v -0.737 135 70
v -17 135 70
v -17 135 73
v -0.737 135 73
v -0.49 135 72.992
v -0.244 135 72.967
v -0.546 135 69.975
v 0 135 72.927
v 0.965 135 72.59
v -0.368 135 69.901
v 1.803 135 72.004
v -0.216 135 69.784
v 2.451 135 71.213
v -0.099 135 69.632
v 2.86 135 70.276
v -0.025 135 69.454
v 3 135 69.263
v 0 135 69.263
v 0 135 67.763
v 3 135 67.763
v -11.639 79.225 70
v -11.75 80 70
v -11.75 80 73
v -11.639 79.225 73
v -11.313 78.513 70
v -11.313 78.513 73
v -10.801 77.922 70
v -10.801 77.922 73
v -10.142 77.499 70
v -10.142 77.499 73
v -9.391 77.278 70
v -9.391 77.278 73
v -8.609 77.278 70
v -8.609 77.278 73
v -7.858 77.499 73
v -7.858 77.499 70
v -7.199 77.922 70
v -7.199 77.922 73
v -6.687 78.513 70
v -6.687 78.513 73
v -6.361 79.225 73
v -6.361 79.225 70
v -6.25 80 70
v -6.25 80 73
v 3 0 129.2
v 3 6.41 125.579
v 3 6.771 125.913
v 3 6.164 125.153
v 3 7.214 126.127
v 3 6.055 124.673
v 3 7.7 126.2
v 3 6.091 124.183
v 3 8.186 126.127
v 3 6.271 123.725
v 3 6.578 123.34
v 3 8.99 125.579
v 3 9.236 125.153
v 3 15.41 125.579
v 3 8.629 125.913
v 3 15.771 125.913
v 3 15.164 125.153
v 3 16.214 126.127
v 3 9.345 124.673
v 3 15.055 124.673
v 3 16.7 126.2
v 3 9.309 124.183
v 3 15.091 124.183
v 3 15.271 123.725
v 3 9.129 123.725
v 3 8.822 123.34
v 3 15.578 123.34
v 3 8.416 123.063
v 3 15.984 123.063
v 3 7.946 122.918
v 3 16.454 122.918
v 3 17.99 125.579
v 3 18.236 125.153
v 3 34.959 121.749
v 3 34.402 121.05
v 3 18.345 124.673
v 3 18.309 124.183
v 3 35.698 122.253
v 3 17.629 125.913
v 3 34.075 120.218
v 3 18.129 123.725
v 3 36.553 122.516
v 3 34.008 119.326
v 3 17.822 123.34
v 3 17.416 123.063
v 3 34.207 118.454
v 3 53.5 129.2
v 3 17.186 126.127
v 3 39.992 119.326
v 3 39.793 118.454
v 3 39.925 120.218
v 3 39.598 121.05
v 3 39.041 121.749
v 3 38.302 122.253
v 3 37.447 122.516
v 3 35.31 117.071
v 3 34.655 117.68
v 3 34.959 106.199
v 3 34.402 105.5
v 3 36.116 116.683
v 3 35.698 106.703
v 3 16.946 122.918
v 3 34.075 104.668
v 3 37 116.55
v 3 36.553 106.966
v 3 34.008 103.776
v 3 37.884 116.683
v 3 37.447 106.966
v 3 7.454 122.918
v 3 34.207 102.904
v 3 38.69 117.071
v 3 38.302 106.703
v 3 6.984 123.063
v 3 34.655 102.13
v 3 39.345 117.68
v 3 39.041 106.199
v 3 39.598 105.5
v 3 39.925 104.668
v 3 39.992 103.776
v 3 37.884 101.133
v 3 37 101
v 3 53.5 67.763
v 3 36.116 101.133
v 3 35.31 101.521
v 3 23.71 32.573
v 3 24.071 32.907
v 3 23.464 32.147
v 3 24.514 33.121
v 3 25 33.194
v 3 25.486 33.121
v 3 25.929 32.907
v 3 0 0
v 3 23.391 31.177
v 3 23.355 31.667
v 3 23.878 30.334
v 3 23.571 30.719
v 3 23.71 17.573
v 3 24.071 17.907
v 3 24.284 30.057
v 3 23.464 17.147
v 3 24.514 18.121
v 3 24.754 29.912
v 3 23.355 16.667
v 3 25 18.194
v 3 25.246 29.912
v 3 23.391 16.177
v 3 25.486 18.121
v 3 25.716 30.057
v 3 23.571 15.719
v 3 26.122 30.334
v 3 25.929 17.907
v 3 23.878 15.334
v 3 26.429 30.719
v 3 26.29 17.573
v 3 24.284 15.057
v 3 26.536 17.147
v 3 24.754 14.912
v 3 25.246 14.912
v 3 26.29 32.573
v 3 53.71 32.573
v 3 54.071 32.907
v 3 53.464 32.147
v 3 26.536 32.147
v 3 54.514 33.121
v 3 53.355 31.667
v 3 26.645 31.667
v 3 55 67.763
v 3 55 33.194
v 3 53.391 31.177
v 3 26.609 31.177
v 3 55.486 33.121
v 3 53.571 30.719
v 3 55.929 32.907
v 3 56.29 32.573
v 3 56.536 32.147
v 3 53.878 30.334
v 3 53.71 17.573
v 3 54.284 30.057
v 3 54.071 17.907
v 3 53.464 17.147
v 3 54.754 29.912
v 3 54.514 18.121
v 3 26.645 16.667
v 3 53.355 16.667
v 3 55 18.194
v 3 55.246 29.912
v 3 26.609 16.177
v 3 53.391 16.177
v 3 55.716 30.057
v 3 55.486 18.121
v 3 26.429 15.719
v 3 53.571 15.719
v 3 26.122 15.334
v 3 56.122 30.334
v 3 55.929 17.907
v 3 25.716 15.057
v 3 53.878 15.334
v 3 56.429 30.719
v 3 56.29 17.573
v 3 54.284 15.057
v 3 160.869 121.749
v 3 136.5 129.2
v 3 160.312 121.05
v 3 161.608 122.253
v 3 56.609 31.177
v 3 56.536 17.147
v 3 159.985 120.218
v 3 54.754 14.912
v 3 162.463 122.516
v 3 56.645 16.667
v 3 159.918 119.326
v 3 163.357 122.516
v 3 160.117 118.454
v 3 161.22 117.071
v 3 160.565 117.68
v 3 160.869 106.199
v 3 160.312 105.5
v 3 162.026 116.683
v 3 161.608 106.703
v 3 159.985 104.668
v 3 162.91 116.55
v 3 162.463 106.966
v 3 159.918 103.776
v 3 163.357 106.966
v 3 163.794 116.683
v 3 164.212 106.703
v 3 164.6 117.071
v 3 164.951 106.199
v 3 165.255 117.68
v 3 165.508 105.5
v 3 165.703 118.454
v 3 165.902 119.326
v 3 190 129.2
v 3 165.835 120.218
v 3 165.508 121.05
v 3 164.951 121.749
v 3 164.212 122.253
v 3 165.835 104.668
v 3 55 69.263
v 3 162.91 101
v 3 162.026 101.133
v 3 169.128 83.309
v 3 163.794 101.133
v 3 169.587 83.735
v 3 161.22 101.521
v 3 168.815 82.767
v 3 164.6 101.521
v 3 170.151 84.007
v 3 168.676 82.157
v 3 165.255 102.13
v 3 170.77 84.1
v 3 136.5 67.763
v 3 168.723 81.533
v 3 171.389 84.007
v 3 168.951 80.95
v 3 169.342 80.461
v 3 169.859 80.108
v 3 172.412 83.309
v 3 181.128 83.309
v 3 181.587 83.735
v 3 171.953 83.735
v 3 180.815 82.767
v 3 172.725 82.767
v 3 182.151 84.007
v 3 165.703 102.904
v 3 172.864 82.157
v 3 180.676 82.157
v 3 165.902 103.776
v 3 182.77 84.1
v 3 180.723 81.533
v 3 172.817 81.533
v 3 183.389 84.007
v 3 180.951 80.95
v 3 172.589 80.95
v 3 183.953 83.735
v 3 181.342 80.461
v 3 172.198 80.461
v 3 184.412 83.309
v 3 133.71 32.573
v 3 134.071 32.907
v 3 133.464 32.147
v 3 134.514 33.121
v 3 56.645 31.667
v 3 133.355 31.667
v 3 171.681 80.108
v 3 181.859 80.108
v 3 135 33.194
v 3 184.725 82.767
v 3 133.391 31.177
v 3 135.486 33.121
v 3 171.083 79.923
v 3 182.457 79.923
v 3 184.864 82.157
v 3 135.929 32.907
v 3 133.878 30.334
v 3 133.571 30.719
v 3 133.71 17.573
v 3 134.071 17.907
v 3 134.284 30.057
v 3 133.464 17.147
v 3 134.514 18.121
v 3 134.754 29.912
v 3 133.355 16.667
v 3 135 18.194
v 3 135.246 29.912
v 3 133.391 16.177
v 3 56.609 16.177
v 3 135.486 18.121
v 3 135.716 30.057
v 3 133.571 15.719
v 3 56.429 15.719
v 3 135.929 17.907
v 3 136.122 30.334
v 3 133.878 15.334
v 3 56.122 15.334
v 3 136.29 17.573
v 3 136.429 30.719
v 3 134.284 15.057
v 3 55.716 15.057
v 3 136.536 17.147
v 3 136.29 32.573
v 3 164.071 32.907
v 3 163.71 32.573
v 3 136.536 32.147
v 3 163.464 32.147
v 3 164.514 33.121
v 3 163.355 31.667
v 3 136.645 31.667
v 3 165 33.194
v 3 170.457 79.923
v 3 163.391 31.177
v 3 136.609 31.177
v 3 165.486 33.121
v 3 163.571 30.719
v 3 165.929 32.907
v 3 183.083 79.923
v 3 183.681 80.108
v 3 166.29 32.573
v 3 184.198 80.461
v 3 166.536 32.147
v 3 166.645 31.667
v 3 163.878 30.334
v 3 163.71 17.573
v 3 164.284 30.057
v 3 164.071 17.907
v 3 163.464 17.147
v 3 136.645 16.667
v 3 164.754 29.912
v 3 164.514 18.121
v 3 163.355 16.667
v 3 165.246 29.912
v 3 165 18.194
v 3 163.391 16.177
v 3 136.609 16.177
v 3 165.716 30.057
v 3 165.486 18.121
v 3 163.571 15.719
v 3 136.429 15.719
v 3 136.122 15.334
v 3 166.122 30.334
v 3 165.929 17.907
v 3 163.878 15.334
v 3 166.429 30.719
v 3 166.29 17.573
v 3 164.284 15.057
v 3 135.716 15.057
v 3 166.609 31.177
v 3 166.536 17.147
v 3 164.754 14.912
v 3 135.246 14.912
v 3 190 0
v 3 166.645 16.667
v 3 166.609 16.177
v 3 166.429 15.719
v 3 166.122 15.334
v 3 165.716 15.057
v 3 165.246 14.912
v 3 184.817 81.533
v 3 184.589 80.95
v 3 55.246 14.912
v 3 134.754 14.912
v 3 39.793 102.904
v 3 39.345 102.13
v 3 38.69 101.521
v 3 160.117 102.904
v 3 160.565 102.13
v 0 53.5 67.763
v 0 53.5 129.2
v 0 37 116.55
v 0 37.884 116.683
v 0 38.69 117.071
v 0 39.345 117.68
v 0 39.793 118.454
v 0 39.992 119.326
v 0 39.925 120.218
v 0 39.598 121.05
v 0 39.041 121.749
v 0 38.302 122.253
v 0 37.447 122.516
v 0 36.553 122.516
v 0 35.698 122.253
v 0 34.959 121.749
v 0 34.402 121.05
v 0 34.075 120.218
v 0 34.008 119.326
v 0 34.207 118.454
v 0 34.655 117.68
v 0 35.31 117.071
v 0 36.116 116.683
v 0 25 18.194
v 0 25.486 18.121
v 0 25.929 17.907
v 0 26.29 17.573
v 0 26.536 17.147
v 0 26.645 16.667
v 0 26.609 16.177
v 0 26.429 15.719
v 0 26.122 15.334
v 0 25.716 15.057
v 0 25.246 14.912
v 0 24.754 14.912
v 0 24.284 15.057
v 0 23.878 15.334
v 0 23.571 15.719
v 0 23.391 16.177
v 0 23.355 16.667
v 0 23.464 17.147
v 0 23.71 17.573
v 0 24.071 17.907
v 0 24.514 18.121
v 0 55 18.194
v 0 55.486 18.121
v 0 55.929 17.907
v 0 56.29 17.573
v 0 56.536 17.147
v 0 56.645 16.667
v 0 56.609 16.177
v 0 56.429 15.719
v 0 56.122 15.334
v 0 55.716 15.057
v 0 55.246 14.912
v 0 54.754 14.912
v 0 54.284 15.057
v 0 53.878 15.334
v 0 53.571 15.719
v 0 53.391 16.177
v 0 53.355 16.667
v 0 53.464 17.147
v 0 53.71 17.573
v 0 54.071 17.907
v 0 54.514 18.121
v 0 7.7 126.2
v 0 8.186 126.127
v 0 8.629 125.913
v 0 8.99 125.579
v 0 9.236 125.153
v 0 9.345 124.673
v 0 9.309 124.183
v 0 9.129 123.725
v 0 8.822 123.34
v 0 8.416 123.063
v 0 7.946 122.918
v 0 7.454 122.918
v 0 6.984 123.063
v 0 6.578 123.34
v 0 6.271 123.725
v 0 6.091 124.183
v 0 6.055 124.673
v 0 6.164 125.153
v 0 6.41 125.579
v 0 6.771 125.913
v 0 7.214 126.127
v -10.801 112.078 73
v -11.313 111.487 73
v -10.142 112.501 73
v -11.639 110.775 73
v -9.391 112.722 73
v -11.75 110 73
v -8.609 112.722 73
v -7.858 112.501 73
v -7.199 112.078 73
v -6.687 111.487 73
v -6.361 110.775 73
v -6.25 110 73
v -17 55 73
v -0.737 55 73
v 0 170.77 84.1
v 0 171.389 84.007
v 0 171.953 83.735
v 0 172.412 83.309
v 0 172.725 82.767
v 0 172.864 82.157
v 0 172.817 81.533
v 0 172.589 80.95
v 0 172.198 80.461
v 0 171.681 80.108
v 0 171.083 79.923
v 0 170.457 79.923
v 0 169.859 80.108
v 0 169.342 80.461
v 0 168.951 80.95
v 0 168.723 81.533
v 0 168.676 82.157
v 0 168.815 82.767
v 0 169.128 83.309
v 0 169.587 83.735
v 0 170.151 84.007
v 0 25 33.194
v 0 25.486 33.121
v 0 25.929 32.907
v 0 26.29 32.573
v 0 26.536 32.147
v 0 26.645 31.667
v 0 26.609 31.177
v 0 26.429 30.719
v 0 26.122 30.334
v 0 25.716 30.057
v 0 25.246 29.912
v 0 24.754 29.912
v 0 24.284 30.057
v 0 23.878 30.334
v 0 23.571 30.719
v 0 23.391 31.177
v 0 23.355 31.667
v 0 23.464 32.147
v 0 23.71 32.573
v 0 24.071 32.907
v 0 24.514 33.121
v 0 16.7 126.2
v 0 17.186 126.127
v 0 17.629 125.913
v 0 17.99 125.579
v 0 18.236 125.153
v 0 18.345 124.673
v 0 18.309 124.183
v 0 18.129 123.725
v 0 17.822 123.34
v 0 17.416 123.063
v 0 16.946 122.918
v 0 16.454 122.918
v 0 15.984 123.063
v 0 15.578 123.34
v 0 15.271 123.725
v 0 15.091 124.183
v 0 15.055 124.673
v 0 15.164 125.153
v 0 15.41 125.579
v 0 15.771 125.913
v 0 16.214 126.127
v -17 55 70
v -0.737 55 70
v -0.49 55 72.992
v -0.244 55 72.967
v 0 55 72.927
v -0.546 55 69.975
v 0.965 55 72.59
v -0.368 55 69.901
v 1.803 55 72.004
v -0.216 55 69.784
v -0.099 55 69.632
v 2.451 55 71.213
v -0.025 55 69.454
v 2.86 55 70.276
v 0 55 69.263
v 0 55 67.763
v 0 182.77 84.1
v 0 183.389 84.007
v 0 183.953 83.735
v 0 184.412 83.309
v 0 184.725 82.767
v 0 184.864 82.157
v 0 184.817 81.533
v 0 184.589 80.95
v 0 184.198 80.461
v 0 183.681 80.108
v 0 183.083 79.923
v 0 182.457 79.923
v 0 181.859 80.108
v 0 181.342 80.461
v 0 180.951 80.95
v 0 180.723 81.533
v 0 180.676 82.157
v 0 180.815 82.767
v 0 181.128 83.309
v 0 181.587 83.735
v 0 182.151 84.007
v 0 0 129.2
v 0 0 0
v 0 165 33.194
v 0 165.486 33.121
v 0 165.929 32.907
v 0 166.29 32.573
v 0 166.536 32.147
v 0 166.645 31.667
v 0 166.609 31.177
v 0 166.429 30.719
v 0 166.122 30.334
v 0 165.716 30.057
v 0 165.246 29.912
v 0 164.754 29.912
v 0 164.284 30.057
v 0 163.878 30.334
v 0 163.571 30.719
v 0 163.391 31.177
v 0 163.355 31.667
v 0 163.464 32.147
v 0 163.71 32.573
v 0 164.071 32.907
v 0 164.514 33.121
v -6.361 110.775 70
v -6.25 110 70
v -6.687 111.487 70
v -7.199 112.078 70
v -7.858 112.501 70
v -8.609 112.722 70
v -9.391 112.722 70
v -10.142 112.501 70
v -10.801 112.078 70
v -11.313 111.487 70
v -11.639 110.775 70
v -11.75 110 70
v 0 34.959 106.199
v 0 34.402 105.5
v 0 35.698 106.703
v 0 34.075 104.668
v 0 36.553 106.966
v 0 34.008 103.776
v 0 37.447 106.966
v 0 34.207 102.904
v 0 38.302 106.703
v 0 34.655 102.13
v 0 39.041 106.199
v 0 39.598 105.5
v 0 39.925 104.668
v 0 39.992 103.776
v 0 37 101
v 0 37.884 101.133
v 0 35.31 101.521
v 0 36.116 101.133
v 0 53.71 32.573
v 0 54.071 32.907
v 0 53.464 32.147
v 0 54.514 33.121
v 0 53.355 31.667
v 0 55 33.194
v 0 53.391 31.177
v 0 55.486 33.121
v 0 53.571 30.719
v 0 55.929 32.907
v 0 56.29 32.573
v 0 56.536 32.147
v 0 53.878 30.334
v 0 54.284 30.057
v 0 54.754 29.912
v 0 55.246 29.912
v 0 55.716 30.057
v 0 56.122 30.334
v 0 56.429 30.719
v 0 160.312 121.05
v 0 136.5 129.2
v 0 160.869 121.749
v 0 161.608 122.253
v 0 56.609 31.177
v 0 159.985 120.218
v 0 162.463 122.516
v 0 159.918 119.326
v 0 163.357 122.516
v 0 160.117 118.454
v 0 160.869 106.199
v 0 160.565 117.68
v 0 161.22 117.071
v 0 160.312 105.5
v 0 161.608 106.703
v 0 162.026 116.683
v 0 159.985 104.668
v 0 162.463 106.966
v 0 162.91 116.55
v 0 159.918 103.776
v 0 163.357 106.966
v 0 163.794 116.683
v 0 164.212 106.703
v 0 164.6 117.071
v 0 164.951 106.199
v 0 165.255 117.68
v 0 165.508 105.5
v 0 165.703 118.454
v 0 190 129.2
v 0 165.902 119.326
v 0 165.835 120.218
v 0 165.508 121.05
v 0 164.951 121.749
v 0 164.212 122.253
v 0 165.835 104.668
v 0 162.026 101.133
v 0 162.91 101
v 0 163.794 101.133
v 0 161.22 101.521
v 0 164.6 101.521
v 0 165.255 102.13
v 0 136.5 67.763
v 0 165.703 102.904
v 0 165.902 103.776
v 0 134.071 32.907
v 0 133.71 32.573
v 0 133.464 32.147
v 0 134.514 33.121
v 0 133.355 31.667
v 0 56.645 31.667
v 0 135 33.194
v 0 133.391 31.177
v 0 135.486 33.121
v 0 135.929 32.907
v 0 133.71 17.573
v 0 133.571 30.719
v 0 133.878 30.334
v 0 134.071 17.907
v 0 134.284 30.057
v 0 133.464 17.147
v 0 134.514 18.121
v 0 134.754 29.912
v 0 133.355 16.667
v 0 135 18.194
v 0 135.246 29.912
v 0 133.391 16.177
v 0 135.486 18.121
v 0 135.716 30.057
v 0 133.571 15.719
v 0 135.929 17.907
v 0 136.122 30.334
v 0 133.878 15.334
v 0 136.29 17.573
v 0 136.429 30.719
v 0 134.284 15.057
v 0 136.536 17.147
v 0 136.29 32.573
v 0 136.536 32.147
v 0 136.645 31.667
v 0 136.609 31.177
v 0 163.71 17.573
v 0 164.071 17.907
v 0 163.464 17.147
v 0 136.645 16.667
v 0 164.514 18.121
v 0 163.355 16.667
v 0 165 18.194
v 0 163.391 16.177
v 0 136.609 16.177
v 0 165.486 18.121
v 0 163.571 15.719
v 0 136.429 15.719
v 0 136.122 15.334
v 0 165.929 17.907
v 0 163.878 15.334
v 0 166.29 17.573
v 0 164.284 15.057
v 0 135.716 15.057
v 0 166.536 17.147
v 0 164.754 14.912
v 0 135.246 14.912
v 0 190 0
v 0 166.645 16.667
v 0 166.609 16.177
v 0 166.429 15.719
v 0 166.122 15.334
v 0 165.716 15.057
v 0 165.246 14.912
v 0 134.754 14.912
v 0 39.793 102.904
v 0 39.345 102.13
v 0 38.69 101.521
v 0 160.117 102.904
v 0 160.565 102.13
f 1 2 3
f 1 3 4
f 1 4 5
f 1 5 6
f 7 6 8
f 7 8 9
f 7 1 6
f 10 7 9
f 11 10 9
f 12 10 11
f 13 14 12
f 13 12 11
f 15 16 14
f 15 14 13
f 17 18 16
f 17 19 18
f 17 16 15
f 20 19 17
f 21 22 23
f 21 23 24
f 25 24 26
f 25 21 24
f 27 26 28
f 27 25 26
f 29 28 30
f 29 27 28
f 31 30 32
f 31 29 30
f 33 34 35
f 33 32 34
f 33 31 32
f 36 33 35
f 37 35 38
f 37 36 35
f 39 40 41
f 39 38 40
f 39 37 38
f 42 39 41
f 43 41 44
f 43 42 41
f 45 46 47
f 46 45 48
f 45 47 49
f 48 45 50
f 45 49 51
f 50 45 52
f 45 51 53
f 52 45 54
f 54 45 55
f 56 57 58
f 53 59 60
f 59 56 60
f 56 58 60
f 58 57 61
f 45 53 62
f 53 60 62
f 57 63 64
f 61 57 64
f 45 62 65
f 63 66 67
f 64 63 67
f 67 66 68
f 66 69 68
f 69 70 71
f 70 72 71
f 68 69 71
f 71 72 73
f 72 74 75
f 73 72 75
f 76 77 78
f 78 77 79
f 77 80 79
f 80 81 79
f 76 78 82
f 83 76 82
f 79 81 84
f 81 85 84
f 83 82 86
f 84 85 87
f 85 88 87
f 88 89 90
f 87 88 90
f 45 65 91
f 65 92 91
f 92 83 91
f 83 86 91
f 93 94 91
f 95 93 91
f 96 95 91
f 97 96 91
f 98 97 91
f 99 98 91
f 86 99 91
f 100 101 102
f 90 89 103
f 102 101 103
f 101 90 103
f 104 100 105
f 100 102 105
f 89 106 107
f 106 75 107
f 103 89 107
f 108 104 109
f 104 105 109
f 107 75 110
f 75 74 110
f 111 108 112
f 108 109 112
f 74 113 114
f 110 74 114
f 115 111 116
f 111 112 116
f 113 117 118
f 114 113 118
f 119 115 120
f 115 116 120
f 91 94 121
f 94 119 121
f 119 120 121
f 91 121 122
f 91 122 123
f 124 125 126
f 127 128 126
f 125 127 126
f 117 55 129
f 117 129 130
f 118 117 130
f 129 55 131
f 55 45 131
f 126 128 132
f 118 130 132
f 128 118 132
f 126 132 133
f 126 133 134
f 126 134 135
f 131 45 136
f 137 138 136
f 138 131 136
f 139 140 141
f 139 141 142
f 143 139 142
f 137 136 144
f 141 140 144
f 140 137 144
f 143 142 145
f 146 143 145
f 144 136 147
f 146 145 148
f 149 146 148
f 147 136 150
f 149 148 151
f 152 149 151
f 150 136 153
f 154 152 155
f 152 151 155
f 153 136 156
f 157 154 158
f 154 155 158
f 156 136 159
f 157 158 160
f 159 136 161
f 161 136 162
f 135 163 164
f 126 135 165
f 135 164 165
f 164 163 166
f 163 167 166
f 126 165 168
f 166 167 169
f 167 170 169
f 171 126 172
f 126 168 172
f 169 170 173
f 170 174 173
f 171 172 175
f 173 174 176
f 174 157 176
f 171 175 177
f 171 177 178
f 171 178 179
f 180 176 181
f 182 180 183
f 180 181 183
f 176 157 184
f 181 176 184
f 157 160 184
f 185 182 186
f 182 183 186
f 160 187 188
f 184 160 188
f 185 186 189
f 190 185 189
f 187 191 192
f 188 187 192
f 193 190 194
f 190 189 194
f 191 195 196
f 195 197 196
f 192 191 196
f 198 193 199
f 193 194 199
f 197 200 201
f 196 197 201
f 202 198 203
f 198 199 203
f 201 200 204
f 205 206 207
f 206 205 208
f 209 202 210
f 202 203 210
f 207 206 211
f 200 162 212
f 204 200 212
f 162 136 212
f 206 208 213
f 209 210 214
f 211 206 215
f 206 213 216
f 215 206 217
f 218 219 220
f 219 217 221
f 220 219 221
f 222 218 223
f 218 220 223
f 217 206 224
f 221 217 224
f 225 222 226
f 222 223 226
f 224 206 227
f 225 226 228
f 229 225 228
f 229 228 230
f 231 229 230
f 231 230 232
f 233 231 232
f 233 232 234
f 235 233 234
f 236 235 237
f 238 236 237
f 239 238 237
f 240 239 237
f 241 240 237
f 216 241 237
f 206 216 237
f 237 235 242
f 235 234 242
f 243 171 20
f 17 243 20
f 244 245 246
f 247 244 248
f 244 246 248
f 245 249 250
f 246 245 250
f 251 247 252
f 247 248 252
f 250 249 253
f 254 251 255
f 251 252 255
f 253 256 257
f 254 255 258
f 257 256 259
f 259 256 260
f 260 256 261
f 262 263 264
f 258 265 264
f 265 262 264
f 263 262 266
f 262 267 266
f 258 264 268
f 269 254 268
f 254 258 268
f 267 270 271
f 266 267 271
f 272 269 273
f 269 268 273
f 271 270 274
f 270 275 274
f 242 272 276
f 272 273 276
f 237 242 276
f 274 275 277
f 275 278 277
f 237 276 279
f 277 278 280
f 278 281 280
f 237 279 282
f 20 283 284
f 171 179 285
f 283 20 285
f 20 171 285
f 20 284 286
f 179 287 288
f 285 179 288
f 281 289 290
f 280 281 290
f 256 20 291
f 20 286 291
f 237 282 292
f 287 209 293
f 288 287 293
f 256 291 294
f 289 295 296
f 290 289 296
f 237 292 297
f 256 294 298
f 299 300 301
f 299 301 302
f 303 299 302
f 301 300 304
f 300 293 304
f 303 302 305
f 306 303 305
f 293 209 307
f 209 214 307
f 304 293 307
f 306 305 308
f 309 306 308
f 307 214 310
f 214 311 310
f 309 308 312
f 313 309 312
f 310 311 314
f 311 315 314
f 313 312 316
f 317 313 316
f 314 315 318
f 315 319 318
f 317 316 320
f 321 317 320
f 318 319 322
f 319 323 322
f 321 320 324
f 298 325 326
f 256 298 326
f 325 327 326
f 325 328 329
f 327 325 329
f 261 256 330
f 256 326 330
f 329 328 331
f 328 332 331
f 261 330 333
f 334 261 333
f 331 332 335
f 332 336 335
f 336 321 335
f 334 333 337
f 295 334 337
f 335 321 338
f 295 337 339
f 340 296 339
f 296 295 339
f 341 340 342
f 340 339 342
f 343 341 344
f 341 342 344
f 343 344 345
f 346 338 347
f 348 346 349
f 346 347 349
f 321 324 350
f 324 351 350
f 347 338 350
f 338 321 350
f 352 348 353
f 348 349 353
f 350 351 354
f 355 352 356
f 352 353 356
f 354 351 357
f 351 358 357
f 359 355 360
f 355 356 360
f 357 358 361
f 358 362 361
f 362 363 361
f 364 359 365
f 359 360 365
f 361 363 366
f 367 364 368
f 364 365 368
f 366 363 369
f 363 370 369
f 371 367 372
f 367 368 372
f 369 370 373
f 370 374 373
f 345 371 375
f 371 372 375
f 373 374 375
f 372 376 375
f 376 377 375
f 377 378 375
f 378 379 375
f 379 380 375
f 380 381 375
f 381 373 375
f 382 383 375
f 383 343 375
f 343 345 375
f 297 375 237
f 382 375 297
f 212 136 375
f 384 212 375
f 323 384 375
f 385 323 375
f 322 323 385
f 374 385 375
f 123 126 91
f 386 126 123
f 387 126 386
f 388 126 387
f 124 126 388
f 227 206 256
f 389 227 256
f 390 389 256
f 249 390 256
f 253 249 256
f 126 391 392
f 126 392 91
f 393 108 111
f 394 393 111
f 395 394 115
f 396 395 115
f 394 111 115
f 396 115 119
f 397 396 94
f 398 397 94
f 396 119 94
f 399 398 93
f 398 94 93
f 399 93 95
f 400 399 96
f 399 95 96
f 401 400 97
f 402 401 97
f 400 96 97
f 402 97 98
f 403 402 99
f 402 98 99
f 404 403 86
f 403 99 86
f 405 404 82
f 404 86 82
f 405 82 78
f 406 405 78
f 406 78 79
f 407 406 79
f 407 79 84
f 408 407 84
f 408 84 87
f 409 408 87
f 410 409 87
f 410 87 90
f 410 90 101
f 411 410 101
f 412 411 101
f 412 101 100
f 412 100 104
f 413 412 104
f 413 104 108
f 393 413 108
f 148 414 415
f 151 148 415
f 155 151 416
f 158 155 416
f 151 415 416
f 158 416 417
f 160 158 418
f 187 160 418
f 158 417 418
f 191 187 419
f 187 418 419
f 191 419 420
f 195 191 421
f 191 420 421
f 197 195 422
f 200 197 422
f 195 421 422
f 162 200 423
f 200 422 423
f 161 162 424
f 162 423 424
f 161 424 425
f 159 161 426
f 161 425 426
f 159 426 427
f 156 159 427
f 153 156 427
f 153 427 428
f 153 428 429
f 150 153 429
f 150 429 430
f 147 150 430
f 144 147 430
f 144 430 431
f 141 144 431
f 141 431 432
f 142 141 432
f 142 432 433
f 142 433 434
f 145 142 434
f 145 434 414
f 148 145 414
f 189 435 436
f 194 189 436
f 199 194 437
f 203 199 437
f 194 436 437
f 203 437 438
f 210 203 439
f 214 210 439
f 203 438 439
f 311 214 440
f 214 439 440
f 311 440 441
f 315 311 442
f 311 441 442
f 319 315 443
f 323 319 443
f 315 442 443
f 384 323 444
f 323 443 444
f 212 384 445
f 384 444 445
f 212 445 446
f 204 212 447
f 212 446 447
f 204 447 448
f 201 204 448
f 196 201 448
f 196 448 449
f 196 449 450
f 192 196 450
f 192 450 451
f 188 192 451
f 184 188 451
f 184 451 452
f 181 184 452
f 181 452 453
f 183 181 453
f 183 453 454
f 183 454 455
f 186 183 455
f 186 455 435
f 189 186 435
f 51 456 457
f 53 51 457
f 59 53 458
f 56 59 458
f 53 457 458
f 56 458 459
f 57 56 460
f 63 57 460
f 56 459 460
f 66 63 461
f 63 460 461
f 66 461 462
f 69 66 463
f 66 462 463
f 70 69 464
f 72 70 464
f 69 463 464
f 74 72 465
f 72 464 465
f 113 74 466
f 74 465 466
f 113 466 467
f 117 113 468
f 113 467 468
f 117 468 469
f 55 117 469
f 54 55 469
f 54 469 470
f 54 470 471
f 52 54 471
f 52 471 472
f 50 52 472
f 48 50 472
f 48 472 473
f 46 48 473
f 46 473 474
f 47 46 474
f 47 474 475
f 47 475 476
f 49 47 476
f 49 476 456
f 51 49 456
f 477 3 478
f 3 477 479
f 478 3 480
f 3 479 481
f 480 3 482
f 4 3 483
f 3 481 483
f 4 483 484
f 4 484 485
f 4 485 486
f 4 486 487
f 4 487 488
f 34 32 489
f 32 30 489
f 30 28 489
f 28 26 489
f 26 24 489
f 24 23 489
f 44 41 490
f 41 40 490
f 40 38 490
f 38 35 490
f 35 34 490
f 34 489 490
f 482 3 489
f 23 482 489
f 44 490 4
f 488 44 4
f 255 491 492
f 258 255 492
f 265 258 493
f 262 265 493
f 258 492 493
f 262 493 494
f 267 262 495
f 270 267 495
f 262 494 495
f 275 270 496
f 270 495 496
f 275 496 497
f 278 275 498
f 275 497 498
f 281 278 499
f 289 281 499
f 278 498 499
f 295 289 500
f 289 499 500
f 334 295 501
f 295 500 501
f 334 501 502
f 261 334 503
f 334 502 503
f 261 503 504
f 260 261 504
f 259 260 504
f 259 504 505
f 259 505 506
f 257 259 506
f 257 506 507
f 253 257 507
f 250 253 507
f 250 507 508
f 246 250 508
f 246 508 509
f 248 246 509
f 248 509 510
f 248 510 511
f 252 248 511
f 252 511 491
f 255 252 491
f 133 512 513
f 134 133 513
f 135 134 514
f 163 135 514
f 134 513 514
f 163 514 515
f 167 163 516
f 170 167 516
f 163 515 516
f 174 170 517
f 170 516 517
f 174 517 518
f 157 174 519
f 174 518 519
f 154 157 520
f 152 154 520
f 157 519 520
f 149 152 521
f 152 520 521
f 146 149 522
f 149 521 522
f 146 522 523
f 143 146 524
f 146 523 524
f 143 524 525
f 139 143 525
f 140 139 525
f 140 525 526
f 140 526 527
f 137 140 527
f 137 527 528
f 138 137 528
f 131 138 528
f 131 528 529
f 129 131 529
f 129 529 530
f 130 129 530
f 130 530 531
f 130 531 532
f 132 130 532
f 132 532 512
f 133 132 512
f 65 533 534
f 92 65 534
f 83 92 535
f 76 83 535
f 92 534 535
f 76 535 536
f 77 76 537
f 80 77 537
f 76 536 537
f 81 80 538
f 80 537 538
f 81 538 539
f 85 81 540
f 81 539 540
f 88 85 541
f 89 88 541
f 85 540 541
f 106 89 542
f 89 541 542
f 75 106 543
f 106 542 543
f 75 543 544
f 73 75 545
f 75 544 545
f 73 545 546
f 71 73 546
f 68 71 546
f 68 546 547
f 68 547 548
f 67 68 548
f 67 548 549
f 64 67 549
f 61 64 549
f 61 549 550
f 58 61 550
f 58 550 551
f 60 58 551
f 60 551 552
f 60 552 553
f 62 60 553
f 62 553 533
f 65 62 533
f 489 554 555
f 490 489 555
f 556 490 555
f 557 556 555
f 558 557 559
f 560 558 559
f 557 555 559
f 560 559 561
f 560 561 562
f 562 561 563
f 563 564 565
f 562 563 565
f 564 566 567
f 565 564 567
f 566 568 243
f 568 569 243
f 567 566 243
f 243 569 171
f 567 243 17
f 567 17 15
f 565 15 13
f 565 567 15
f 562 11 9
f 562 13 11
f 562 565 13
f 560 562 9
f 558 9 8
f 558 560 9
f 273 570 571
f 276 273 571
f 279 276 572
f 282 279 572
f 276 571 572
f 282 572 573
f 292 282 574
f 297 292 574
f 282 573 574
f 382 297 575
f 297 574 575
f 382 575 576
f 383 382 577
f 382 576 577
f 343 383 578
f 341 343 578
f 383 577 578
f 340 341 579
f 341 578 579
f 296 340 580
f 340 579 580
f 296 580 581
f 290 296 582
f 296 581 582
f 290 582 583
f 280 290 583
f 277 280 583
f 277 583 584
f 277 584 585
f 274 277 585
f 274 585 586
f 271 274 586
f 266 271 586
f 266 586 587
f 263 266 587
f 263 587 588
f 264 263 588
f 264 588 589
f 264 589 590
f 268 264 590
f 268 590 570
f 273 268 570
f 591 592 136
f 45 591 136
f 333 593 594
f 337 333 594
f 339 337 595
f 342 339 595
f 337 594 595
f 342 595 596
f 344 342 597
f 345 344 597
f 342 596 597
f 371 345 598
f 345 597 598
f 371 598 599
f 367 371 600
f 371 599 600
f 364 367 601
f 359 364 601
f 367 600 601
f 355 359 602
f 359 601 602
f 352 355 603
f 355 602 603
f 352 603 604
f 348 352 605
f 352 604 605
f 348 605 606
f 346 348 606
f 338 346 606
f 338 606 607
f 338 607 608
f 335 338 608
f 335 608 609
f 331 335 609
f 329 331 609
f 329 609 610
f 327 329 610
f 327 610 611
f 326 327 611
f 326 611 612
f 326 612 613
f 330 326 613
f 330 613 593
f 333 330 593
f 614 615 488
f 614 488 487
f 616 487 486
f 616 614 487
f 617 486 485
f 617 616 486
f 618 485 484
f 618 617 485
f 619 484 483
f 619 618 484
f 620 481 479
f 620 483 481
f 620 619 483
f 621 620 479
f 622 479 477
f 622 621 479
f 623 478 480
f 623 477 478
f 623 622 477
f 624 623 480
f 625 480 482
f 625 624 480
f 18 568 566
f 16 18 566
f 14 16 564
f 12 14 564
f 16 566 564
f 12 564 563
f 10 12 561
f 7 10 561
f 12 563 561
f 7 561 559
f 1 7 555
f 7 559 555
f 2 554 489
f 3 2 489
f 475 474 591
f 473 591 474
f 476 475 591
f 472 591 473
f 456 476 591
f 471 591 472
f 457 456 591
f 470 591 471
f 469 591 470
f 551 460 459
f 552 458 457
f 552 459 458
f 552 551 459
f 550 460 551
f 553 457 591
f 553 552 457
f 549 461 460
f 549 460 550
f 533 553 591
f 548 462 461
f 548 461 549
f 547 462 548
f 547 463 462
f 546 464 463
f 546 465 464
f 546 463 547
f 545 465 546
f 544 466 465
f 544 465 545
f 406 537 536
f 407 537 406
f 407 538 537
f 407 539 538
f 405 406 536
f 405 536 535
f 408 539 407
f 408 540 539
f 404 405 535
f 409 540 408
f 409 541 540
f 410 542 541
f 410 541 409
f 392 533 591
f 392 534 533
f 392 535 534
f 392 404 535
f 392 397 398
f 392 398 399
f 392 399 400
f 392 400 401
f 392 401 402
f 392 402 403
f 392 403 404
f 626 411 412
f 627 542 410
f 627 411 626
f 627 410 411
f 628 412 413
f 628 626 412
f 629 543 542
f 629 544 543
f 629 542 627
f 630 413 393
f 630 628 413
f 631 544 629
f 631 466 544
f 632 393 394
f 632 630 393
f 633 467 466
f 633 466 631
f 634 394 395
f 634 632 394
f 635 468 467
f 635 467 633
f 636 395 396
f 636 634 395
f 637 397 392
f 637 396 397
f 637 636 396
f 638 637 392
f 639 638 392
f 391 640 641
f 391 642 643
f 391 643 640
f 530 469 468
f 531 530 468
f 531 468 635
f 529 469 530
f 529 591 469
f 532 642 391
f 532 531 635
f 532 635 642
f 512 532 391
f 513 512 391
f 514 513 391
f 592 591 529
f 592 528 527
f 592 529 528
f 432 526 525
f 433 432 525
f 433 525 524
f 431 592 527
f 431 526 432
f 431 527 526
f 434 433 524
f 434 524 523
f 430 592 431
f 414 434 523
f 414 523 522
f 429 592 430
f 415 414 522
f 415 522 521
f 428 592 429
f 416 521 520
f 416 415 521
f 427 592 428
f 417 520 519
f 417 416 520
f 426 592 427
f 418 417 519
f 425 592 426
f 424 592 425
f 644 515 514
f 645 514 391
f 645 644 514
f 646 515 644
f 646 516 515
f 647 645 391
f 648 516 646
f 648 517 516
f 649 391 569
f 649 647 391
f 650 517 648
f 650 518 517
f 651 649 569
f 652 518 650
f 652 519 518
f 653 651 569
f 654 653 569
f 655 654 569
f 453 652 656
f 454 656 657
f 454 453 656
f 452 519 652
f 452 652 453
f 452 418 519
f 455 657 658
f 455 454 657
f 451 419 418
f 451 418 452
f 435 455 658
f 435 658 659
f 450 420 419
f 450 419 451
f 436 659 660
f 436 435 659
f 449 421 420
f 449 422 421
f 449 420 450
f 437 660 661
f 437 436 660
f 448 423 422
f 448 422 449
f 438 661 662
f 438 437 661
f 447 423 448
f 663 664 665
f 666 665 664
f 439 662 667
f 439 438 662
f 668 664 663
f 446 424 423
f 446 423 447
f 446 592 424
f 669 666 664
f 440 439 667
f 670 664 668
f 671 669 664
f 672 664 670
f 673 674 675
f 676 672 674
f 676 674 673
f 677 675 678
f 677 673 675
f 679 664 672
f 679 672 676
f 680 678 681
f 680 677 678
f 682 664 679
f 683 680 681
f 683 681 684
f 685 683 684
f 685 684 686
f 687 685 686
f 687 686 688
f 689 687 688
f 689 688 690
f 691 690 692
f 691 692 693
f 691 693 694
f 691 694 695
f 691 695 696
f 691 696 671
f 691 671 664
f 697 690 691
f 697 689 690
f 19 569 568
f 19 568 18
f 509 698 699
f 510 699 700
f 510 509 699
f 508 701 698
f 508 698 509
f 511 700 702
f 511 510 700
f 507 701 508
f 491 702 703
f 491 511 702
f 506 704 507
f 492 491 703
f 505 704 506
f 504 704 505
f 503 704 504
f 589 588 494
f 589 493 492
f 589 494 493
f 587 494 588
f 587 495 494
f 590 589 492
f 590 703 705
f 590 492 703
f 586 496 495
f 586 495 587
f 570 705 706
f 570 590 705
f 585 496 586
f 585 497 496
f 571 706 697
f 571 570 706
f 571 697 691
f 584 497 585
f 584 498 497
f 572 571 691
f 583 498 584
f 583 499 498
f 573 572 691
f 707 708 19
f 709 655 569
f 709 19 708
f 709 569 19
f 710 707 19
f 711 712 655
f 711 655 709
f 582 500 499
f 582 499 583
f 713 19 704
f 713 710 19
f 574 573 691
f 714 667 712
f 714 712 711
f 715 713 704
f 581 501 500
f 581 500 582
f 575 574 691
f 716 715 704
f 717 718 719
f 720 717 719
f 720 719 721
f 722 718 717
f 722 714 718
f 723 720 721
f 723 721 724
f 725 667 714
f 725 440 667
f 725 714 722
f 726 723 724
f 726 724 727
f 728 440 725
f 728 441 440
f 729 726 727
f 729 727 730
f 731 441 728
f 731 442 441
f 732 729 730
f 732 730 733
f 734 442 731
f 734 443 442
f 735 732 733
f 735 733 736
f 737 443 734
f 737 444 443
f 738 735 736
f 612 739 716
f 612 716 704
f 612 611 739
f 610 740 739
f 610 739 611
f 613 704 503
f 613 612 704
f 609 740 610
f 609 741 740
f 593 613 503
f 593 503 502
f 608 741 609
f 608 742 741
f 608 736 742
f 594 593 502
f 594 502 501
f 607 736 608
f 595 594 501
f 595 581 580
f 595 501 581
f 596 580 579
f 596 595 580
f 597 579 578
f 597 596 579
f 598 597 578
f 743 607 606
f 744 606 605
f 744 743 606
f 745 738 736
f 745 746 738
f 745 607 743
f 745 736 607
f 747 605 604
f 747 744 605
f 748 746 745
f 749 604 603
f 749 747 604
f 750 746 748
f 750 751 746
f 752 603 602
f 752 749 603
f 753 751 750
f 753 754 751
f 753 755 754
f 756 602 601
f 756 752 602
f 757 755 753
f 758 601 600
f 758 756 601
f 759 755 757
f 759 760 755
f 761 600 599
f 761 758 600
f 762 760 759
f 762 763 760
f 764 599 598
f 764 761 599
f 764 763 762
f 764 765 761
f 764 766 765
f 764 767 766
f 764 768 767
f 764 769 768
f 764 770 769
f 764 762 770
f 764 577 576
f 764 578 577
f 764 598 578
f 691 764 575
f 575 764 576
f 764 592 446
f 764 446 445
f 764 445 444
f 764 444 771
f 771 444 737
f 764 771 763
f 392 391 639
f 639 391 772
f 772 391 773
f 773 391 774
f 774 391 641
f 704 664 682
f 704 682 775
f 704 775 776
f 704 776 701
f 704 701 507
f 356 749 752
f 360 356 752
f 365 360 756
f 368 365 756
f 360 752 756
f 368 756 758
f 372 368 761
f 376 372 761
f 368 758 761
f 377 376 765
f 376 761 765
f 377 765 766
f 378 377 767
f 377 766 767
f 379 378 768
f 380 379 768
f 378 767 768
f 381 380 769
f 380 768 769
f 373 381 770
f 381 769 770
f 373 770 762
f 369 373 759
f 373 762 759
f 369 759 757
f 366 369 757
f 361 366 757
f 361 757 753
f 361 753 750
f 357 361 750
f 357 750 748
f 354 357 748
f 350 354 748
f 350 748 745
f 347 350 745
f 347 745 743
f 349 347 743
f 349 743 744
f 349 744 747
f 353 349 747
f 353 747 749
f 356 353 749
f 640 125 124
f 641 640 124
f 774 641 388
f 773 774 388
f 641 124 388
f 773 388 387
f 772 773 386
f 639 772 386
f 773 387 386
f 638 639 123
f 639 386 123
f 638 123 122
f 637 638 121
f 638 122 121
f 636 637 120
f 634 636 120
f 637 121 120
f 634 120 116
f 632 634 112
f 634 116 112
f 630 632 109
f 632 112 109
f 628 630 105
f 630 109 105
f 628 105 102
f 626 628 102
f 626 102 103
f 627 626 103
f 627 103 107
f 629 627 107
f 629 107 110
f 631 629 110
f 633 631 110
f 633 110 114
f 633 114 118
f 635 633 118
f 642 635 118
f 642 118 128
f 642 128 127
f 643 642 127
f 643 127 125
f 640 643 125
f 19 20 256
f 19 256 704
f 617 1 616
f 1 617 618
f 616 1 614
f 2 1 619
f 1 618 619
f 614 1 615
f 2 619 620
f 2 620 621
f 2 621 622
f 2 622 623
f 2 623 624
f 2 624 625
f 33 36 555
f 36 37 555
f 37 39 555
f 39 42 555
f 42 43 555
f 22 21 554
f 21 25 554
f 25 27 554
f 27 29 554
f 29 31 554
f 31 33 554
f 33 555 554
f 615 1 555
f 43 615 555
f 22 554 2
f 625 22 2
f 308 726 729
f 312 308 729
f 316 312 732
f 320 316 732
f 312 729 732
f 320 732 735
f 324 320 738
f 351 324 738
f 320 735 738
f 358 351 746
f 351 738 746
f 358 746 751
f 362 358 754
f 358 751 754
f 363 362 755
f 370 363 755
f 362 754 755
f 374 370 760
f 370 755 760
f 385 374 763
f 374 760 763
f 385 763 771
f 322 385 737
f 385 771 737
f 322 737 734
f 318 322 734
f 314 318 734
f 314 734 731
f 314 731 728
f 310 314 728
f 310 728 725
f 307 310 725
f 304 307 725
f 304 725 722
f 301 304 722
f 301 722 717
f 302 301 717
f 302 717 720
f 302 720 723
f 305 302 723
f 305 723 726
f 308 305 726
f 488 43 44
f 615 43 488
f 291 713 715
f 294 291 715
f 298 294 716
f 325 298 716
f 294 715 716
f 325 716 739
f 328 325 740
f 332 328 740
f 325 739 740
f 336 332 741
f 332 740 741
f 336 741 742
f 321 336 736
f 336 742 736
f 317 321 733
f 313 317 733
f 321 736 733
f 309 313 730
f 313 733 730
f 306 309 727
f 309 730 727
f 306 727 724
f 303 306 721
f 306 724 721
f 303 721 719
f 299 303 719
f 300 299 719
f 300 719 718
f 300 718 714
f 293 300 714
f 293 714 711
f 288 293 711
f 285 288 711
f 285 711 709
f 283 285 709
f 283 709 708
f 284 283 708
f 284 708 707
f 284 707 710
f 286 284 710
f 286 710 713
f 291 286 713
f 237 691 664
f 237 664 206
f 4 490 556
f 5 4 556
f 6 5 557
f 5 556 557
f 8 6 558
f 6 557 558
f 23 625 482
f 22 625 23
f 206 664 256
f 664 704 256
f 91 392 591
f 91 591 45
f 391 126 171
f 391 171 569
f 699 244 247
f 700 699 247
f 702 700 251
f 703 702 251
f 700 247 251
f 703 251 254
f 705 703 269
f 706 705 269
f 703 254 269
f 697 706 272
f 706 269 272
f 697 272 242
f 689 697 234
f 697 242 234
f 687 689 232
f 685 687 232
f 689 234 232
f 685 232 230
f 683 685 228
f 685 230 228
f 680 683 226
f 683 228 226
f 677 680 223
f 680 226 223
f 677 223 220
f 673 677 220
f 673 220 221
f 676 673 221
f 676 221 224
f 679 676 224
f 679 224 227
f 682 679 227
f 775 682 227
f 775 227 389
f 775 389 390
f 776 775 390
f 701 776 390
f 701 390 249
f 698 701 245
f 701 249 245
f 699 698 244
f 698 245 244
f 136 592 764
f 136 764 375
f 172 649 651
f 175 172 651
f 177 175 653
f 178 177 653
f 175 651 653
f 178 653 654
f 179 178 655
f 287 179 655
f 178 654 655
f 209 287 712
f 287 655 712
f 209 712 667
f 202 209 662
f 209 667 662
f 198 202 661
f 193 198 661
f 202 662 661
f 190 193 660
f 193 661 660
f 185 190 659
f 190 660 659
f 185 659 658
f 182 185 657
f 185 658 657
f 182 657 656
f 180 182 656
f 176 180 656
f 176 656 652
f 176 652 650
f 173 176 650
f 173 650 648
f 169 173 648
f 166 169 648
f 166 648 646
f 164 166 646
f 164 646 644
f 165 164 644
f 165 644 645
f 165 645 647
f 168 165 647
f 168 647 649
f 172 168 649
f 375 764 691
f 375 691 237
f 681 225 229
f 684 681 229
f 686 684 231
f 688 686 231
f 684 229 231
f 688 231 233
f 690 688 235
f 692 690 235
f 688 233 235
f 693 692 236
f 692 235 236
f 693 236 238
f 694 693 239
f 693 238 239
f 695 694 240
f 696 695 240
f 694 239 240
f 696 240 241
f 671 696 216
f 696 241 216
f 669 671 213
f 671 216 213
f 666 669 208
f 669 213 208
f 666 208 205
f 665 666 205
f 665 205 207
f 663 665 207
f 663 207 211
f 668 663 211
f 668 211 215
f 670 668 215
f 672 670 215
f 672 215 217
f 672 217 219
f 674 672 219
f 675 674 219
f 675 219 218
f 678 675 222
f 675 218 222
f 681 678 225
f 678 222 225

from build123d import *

# Parameters (mm, degrees)
SKETCH_2_W               = 3
SKETCH_2_H               = 190
SM_BASE_FLANGE_1_DEPTH   = 89.2
SKETCH_14_W              = 16.2
SKETCH_14_H              = 80
CUT_EXTRUDE_2_DEPTH      = 10
SM_START                 = 53.5
SM_EDGE_FLANGE_1_DEPTH   = 83
SM_EDGE_FLANGE_1_2_DEPTH = 1.5
SM_START_2               = 135
SM_EDGE_FLANGE_1_3_DEPTH = 1.5
SM_START_3               = 55
SM_EDGE_FLANGE_1_4_DEPTH = 80
CUT_EXTRUDE_START        = -1.5
SKETCH_18_W              = 3
SKETCH_18_H              = 16.2
CUT_EXTRUDE_3_DEPTH      = 1.5
SKETCH_19_W              = 3
SKETCH_19_H              = 16.2
CUT_EXTRUDE_4_DEPTH      = 1.5
CUT_EXTRUDE_5_DEPTH      = 10
HOLE_WIZARD_M4_2_D       = 3.3
HOLE_WIZARD_M4_2_DEPTH   = 10.1
HOLE_WIZARD_M4_2_TIP     = 0.991420021
HOLE_WIZARD_M5_1_D       = 4.2
HOLE_WIZARD_M5_1_DEPTH   = 12.4
HOLE_WIZARD_M5_1_TIP     = 1.2618073
SKETCH_25_W              = 3
SKETCH_25_H              = 53.5
EXTRUDE_1_DEPTH          = 40
SKETCH_26_R              = 3
CUT_EXTRUDE_6_DEPTH      = 3
PATTERN_LINEAR_1_COUNT   = 2
PATTERN_LINEAR_1_PITCH   = 15.55
SKETCH_27_R              = 3
CUT_EXTRUDE_7_DEPTH      = 231.635296518
HOLE_WIZARD_M4_3_D       = 3.3
HOLE_WIZARD_M4_3_DEPTH   = 10.1
HOLE_WIZARD_M4_3_TIP     = 0.991420021


# Read off the part's stored shape, not the designer's step: 边线-法兰1
# Sheet-metal steps are written as plain solids
with BuildPart() as part:
    # Sketch 2 → 基体-法兰1 (new body)
    with BuildSketch(Plane.XY):
        with Locations((1.5, 95)):
            Rectangle(SKETCH_2_W, SKETCH_2_H)
    extrude(amount=SM_BASE_FLANGE_1_DEPTH)

    # 草图14 → 切除-拉伸2 (cut)
    with BuildSketch(Plane(origin=(3, 0, 0), x_dir=(0, 0, -1), z_dir=(1, 0, 0))):
        with Locations((-81.1, 95)):
            Rectangle(SKETCH_14_W, SKETCH_14_H)
    extrude(amount=-CUT_EXTRUDE_2_DEPTH, mode=Mode.SUBTRACT)

    # 边线-法兰1 outline → 边线-法兰1 (cut)
    with BuildSketch(Plane(origin=(0, 0, 0), x_dir=(1, 0, 0), z_dir=(0, 1, 0)).offset(SM_START)):
        with BuildLine():
            Line((3, -73), (3, -69.2634))
            ThreePointArc((3, -69.2634), (2.154295979, -71.630867001), (0, -72.926677222))
            Line((0, -72.926677222), (0, -73))
            Line((0, -73), (3, -73))
        make_face()
    extrude(amount=SM_EDGE_FLANGE_1_DEPTH, mode=Mode.SUBTRACT)

    # Sm Edge Flange 1 2 outline → Sm Edge Flange 1 2 (cut)
    with BuildSketch(Plane(origin=(0, 0, 0), x_dir=(1, 0, 0), z_dir=(0, 1, 0)).offset(SM_START)):
        with BuildLine():
            Line((3, -67.7634), (0, -67.7634))
            Line((0, -67.7634), (0, -72.926677222))
            ThreePointArc((0, -72.926677222), (2.154295979, -71.630867001), (3, -69.2634))
            Line((3, -69.2634), (3, -67.7634))
        make_face()
    extrude(amount=SM_EDGE_FLANGE_1_2_DEPTH, mode=Mode.SUBTRACT)

    # Sm Edge Flange 1 3 outline → Sm Edge Flange 1 3 (cut)
    with BuildSketch(Plane(origin=(0, 0, 0), x_dir=(1, 0, 0), z_dir=(0, 1, 0)).offset(SM_START_2)):
        with BuildLine():
            Line((3, -67.7634), (0, -67.7634))
            Line((0, -67.7634), (0, -72.926677222))
            ThreePointArc((0, -72.926677222), (2.154295979, -71.630867001), (3, -69.2634))
            Line((3, -69.2634), (3, -67.7634))
        make_face()
    extrude(amount=SM_EDGE_FLANGE_1_3_DEPTH, mode=Mode.SUBTRACT)

    # Sm Edge Flange 1 4 outline → Sm Edge Flange 1 4 (add)
    with BuildSketch(Plane(origin=(0, 0, 0), x_dir=(1, 0, 0), z_dir=(0, 1, 0)).offset(SM_START_3)):
        with BuildLine():
            Line((0, -72.926677222), (0, -69.2634))
            ThreePointArc((0, -69.2634), (-0.215745145, -69.784254855), (-0.7366, -70))
            Line((-0.7366, -70), (-17, -70))
            Line((-17, -70), (-17, -73))
            Line((-17, -73), (-0.7366, -73))
            ThreePointArc((-0.7366, -73), (-0.36647982, -72.981624121), (0, -72.926677222))
        make_face()
    extrude(amount=SM_EDGE_FLANGE_1_4_DEPTH)

    # 草图18 → 切除-拉伸3 (cut)
    with BuildSketch(Plane.XZ.offset(-135).offset(CUT_EXTRUDE_START)):
        with Locations((1.5, 81.1)):
            Rectangle(SKETCH_18_W, SKETCH_18_H)
    extrude(amount=CUT_EXTRUDE_3_DEPTH, mode=Mode.SUBTRACT)

    # 草图19 → 切除-拉伸4 (cut)
    with BuildSketch(Plane(origin=(0, 55, 0), x_dir=(1, 0, 0), z_dir=(0, 1, 0)).offset(CUT_EXTRUDE_START)):
        with Locations((1.5, -81.1)):
            Rectangle(SKETCH_19_W, SKETCH_19_H)
    extrude(amount=CUT_EXTRUDE_4_DEPTH, mode=Mode.SUBTRACT)

    # 草图20 → 切除-拉伸5 (cut)
    with BuildSketch(Plane(origin=(0, 0, 70), x_dir=(-1, 0, 0), z_dir=(0, 0, -1))):
        with BuildLine():
            Line((6.25, 80), (6.25, 110))
            ThreePointArc((6.25, 110), (9, 112.75), (11.75, 110))
            Line((11.75, 110), (11.75, 80))
            ThreePointArc((11.75, 80), (9, 77.25), (6.25, 80))
        make_face()
    extrude(amount=-CUT_EXTRUDE_5_DEPTH, mode=Mode.SUBTRACT)

    # M4 螺纹孔2
    with Locations(Plane(origin=(3, 0, 0), x_dir=(0, 0, -1), z_dir=(1, 0, 0))):
        with Locations((-31.544019194, 25), (-16.544019194, 25), (-31.544019194, 55), (-16.544019194, 55), (-16.544019194, 135), (-31.544019194, 135), (-16.544019194, 165), (-31.544019194, 165)):
            Hole(HOLE_WIZARD_M4_2_D / 2, depth=HOLE_WIZARD_M4_2_DEPTH)
            with Locations((0, 0, -(HOLE_WIZARD_M4_2_DEPTH + HOLE_WIZARD_M4_2_TIP / 2))):  # 118° drill point
                Cone(0, HOLE_WIZARD_M4_2_D / 2, HOLE_WIZARD_M4_2_TIP, mode=Mode.SUBTRACT)

    # M5 螺纹孔1
    with Locations(Plane(origin=(3, 0, 0), x_dir=(0, 0, -1), z_dir=(1, 0, 0))):
        with Locations((-82, 170.77), (-82, 182.77)):
            Hole(HOLE_WIZARD_M5_1_D / 2, depth=HOLE_WIZARD_M5_1_DEPTH)
            with Locations((0, 0, -(HOLE_WIZARD_M5_1_DEPTH + HOLE_WIZARD_M5_1_TIP / 2))):  # 118° drill point
                Cone(0, HOLE_WIZARD_M5_1_D / 2, HOLE_WIZARD_M5_1_TIP, mode=Mode.SUBTRACT)

    # 草图25 → 凸台-拉伸1 (add)
    with BuildSketch(Plane.XY.offset(89.2)):
        with Locations((1.5, 163.25)):
            Rectangle(SKETCH_25_W, SKETCH_25_H)
        with Locations((1.5, 26.75)):
            Rectangle(SKETCH_25_W, SKETCH_25_H)
    extrude(amount=EXTRUDE_1_DEPTH)

    # 草图26 → 切除-拉伸6 (cut)
    with BuildSketch(Plane(origin=(3, 0, 0), x_dir=(0, 0, -1), z_dir=(1, 0, 0))):
        with Locations((-119.55, 162.91)):
            Circle(SKETCH_26_R)
    cut_extrude_6 = extrude(amount=-CUT_EXTRUDE_6_DEPTH, mode=Mode.SUBTRACT)

    # 阵列(线性)1: 切除-拉伸6 ×2
    with Locations(*[(0, 0, -i * PATTERN_LINEAR_1_PITCH) for i in range(1, PATTERN_LINEAR_1_COUNT)]):
        add(cut_extrude_6, mode=Mode.SUBTRACT)

    # 草图27 → 切除-拉伸7 (cut, through all)
    with BuildSketch(Plane(origin=(3, 0, 0), x_dir=(0, 0, -1), z_dir=(1, 0, 0))):
        with Locations((-104, 37)):
            Circle(SKETCH_27_R)
        with Locations((-119.55, 37)):
            Circle(SKETCH_27_R)
    extrude(amount=-CUT_EXTRUDE_7_DEPTH, mode=Mode.SUBTRACT)

    # M4 螺纹孔3
    with Locations(Plane(origin=(3, 0, 0), x_dir=(0, 0, -1), z_dir=(1, 0, 0))):
        with Locations((-124.55, 16.7), (-124.55, 7.7)):
            Hole(HOLE_WIZARD_M4_3_D / 2, depth=HOLE_WIZARD_M4_3_DEPTH)
            with Locations((0, 0, -(HOLE_WIZARD_M4_3_DEPTH + HOLE_WIZARD_M4_3_TIP / 2))):  # 118° drill point
                Cone(0, HOLE_WIZARD_M4_3_D / 2, HOLE_WIZARD_M4_3_TIP, mode=Mode.SUBTRACT)


solid = part.part
